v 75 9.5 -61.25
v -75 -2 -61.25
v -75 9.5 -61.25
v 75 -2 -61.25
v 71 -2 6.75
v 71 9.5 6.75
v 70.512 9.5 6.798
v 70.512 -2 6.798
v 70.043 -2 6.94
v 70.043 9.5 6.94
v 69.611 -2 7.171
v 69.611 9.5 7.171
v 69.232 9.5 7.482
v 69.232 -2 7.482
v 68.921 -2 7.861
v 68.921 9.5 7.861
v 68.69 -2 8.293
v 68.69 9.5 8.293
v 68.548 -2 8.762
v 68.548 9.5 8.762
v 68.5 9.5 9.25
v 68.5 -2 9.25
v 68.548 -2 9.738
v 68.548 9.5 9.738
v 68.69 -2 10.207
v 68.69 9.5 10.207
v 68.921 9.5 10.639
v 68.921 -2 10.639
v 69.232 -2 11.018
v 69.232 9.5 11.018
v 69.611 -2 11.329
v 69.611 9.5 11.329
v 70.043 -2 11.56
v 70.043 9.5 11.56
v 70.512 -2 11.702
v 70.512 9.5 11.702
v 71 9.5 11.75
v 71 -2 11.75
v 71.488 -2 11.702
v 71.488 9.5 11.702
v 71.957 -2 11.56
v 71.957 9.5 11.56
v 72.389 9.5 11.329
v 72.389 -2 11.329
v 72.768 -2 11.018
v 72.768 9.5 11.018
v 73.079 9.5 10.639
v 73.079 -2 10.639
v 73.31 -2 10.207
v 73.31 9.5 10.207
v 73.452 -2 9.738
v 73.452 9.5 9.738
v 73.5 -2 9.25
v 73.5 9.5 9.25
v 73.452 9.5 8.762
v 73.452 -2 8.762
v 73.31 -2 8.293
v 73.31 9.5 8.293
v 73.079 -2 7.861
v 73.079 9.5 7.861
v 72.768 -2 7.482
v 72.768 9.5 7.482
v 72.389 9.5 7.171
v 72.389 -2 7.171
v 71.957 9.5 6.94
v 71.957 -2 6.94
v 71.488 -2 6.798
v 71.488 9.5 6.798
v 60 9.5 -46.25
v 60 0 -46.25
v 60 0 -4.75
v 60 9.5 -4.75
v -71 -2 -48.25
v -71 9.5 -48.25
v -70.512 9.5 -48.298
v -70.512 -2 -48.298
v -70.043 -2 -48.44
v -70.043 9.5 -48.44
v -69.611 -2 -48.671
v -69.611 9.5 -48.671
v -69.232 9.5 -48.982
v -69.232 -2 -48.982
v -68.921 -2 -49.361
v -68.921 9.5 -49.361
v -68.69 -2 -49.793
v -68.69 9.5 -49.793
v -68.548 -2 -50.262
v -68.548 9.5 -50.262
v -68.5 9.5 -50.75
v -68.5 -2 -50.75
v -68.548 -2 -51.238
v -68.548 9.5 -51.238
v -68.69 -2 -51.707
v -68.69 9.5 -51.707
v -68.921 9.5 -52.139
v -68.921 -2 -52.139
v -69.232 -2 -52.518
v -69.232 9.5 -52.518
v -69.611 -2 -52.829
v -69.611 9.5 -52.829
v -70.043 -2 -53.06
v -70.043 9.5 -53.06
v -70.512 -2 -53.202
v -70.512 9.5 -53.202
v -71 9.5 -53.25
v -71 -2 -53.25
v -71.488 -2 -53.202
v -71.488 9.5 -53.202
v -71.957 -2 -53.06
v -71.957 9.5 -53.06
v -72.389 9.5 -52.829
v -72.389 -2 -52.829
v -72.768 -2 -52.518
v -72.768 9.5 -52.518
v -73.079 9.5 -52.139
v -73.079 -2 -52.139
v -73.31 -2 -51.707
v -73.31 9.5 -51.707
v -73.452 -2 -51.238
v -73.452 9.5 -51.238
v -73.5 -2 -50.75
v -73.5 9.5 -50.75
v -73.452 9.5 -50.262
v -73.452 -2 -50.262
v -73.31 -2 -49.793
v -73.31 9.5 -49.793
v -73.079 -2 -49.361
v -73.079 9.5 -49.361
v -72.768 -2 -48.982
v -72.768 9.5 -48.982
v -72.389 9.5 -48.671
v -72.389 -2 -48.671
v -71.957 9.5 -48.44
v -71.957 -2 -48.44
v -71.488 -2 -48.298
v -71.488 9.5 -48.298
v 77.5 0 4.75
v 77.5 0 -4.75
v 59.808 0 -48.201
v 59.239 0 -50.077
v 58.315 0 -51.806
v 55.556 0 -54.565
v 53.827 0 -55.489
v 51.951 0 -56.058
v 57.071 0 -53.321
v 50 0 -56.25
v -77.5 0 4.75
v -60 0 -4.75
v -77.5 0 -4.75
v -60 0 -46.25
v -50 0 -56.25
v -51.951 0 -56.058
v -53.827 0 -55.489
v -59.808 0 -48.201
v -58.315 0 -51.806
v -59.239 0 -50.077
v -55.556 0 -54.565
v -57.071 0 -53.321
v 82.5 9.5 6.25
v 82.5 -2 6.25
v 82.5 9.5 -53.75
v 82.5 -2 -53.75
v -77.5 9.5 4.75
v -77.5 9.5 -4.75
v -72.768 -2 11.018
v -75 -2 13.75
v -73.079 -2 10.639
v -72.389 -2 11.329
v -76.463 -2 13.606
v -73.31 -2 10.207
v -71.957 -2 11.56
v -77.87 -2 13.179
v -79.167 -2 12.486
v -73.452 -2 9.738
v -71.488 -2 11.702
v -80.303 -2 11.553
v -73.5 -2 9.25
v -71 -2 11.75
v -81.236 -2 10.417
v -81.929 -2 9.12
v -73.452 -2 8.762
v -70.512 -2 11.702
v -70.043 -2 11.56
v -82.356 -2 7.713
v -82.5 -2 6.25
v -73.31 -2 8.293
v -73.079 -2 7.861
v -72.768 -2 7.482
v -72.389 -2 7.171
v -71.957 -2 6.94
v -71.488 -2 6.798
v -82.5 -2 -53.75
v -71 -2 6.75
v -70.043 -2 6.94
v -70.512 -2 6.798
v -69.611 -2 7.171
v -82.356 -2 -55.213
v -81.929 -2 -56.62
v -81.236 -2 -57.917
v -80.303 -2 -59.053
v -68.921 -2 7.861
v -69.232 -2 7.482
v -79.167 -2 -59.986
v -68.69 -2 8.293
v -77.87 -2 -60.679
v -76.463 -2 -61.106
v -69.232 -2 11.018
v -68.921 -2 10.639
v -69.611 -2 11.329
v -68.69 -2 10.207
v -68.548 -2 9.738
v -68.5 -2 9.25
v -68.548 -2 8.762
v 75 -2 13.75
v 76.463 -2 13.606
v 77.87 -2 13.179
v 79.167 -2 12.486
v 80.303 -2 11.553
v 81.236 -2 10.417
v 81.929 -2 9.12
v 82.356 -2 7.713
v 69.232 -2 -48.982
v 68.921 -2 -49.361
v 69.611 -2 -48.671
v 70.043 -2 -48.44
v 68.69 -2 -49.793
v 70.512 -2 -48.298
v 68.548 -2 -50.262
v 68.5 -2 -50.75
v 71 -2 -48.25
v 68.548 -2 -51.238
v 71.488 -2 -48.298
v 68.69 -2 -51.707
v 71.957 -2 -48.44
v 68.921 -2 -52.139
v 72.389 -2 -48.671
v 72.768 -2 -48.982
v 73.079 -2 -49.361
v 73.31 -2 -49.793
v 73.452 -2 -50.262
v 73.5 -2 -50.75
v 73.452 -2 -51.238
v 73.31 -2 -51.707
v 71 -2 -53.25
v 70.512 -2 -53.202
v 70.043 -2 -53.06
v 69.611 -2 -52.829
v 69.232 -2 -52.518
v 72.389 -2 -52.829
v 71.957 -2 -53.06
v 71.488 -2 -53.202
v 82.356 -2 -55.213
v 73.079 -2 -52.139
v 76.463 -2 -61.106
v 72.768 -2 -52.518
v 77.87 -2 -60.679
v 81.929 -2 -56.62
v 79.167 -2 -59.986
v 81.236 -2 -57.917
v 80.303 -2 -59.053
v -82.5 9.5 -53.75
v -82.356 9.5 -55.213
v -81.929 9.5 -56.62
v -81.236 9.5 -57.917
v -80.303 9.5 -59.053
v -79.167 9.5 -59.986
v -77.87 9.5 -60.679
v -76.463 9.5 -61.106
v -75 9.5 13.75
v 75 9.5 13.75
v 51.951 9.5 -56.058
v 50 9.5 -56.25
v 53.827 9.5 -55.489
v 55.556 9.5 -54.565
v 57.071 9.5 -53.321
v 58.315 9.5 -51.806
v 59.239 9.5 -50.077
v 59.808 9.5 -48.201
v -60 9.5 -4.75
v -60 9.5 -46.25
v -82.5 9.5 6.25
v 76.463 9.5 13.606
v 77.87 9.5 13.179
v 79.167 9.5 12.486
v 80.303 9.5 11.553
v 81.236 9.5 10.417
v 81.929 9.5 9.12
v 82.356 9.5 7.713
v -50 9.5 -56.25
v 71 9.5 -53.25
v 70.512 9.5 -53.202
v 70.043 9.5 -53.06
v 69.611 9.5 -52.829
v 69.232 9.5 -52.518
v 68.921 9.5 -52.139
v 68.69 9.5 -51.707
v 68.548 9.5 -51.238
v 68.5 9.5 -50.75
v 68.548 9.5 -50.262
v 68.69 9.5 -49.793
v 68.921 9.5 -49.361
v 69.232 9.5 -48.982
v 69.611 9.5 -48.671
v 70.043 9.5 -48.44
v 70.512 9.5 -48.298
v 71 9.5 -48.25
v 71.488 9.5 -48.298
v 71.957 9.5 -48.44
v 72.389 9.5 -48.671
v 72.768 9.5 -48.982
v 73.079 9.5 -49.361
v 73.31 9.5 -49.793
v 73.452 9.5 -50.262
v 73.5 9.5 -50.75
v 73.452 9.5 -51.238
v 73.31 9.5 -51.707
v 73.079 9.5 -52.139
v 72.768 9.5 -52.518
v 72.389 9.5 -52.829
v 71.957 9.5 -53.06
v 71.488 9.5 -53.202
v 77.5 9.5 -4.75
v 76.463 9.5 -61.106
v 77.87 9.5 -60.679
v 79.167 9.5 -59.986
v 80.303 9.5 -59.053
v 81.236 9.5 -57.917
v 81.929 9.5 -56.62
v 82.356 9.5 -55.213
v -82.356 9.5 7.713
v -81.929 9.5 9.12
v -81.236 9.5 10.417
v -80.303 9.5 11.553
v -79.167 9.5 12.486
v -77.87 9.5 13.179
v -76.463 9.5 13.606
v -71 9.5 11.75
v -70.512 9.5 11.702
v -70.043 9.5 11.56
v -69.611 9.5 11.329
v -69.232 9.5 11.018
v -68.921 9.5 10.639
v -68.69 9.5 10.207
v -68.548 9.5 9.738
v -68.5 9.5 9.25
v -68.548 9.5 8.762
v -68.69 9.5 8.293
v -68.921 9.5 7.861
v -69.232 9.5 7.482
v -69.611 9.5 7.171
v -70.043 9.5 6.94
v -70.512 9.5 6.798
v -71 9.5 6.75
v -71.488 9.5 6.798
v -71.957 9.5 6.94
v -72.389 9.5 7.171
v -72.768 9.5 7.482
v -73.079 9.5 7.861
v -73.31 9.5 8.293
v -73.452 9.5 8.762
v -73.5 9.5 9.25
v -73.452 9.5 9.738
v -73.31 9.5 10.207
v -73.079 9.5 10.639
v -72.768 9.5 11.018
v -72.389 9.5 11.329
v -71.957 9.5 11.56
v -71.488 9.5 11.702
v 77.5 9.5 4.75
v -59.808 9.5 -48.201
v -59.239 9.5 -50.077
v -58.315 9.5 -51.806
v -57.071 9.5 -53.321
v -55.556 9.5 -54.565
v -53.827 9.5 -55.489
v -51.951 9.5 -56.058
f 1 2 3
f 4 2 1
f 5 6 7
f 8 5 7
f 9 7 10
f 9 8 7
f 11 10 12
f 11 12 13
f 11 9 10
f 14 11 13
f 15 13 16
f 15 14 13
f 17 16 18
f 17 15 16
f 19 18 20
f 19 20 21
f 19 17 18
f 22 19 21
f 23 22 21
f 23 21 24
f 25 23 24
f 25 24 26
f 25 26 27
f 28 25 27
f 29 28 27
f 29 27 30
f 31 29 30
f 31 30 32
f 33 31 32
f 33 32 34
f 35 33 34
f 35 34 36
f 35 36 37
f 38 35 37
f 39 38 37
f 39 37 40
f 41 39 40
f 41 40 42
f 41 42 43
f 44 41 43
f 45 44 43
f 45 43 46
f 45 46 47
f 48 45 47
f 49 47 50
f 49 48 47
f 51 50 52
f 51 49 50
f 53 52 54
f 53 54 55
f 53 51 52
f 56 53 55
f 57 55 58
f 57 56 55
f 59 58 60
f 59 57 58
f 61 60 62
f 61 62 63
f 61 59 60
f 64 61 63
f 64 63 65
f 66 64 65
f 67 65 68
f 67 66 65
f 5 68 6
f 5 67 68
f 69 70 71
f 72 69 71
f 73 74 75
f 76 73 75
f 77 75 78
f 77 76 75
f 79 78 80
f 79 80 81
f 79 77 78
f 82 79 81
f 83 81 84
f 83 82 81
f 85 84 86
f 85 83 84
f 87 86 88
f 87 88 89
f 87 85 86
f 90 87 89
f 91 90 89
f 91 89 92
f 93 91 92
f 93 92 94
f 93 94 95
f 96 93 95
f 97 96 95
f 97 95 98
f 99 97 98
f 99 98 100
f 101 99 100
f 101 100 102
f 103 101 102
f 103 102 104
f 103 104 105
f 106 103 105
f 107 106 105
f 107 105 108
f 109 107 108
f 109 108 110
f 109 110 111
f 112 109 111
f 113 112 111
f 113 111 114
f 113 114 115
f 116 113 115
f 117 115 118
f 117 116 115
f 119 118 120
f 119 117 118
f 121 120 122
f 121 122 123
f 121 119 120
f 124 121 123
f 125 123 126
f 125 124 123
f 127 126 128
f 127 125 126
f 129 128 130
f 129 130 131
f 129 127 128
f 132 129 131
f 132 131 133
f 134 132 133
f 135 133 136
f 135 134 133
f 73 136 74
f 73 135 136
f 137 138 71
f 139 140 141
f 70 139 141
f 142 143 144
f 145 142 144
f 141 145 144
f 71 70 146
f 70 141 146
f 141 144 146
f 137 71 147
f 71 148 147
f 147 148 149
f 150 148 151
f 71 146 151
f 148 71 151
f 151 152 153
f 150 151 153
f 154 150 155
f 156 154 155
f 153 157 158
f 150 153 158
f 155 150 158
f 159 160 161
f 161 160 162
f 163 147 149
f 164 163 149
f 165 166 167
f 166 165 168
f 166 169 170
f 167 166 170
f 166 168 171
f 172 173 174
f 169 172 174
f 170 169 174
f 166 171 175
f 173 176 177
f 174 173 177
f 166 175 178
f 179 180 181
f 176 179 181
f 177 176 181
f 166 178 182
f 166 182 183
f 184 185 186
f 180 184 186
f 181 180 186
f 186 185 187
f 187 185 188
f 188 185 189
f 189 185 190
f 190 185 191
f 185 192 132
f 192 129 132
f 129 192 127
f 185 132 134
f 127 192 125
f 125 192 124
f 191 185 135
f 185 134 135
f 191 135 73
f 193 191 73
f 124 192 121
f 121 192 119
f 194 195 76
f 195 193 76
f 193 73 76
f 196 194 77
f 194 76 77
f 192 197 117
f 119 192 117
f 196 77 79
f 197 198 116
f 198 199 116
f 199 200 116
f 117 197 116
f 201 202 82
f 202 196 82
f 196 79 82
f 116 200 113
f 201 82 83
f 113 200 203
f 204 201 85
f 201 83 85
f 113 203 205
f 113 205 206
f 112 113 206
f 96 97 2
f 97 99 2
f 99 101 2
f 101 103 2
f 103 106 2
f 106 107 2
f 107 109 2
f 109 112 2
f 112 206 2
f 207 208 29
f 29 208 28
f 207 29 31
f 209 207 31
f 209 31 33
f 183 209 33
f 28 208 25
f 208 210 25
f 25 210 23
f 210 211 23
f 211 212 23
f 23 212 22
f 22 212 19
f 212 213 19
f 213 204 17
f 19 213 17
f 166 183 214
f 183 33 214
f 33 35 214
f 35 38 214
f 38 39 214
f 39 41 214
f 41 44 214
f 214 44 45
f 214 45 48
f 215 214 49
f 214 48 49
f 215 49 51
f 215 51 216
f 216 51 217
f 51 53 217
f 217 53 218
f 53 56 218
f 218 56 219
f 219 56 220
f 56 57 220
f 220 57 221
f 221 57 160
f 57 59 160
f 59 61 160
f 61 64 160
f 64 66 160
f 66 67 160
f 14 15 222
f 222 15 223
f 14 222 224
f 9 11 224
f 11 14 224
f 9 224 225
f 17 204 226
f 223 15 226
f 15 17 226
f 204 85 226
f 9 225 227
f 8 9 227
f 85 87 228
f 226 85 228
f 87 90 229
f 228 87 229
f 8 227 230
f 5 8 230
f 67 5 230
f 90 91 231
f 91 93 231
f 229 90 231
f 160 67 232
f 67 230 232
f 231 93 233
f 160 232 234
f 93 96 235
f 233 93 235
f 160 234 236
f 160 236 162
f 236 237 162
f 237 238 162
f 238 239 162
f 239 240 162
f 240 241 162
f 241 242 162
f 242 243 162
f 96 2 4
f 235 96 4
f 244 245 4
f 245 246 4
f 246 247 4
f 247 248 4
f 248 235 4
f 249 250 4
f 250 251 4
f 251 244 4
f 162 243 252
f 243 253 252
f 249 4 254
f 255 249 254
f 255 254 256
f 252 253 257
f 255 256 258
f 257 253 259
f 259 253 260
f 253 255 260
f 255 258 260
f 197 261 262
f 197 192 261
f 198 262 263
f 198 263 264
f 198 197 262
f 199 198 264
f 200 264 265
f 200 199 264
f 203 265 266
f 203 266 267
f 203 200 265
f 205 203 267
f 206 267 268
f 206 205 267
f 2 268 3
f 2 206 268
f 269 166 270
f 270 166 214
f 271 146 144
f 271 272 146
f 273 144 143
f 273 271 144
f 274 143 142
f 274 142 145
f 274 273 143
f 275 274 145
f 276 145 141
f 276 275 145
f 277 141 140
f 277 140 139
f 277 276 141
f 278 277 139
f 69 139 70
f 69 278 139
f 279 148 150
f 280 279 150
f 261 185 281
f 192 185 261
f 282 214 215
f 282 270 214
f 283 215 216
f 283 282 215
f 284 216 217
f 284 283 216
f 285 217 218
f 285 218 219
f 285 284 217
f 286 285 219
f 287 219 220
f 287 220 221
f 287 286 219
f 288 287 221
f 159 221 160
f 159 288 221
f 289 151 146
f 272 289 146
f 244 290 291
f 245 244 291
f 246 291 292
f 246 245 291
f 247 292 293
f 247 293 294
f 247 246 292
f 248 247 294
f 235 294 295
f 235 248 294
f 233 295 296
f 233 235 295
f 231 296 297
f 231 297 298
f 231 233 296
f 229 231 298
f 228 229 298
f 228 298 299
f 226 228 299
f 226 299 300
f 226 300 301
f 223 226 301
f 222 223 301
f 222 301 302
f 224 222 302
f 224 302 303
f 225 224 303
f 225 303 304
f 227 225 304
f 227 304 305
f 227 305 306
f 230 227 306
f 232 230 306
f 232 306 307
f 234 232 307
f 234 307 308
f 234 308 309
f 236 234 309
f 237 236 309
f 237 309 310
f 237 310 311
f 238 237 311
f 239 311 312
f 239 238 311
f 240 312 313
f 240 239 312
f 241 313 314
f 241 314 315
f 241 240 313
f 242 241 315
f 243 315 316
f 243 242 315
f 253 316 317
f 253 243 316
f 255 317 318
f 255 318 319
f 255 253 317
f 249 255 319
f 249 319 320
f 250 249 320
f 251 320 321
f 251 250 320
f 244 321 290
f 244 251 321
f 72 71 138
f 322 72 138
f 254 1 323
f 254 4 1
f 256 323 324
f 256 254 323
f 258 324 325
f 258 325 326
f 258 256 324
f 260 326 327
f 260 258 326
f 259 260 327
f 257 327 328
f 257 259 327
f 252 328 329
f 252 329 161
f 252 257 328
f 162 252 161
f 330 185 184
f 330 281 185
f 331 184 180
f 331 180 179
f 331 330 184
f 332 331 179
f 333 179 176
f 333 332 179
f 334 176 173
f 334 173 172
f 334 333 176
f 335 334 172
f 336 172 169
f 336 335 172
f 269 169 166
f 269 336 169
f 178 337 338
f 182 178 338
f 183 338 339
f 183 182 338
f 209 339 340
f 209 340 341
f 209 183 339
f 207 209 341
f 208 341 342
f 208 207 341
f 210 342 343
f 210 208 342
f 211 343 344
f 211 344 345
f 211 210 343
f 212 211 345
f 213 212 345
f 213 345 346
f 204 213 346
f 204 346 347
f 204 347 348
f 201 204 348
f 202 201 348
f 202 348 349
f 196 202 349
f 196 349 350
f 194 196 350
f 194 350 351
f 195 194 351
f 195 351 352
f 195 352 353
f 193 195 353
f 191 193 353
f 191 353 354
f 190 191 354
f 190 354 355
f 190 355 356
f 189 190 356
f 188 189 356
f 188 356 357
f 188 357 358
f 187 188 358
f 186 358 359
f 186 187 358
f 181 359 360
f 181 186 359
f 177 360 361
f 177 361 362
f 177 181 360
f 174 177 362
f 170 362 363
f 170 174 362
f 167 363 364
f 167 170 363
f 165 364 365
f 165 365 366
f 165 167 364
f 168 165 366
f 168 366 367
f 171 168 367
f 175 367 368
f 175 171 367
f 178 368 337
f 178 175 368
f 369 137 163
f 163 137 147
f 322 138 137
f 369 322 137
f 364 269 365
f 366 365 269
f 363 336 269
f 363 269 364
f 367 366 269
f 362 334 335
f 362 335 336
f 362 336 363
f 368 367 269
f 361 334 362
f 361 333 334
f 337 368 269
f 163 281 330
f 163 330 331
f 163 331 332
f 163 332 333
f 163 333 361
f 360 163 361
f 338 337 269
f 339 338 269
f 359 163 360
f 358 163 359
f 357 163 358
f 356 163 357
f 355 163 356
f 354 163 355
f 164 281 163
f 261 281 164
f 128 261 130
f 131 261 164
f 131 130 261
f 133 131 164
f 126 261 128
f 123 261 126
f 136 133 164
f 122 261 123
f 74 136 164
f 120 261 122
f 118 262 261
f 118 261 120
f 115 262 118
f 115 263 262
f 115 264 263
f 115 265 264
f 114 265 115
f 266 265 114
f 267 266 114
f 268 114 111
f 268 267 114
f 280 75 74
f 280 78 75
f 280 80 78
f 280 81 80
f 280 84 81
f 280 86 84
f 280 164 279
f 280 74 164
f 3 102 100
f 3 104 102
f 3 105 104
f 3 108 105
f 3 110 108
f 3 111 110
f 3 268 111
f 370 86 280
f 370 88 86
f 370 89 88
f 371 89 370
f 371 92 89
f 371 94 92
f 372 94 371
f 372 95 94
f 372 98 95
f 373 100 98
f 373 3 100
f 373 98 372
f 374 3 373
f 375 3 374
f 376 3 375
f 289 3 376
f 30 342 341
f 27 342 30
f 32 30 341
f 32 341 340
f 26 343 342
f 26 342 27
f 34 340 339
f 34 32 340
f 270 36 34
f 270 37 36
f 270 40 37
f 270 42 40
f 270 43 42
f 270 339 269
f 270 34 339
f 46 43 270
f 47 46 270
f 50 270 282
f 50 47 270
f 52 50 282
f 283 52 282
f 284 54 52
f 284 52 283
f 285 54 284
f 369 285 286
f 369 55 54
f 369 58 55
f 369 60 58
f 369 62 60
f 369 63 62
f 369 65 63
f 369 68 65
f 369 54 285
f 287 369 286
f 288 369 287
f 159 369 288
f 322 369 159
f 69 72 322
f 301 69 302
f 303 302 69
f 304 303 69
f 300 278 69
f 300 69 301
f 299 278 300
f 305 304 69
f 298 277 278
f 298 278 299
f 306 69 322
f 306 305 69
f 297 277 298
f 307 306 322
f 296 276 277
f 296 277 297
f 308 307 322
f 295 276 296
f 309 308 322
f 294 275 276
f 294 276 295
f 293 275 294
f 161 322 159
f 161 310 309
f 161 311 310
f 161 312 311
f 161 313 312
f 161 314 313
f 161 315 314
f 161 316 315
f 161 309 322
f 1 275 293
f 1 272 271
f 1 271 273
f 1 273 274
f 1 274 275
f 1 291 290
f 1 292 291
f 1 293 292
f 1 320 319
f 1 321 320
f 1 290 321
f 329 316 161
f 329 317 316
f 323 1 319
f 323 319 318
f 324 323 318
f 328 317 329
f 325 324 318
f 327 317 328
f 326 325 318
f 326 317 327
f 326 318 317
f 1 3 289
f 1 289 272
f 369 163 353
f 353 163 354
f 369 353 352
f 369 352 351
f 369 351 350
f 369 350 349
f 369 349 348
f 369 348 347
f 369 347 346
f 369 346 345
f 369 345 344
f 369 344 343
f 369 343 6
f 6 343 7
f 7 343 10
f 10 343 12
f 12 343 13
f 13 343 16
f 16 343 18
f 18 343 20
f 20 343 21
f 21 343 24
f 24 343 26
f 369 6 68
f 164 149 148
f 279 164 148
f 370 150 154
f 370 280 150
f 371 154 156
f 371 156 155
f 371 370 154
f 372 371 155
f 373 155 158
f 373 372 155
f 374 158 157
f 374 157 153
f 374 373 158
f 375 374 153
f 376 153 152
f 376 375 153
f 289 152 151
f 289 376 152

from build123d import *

# Parameters (mm, degrees)
SKETCH_1_W      = 165
SKETCH_1_H      = 75
SKETCH_1_R      = 2.5
EXTRUDE_1_DEPTH = 9.5
EXTRUDE_START   = -2
SKETCH_1_2_W    = 165
SKETCH_1_2_H    = 75
SKETCH_1_2_R    = 2.5
EXTRUDE_2_DEPTH = 2
FILLET_1_R      = 10
FILLET_2_R      = 7.5


with BuildPart() as part:
    # Эскиз1 → Бобышка-Вытянуть1 (new body)
    with BuildSketch(Plane(origin=(0, 0, 0), x_dir=(1, 0, 0), z_dir=(0, 1, 0))):
        with Locations((0, 23.75)):
            Rectangle(SKETCH_1_W, SKETCH_1_H)
        with Locations((-71, -9.25)):
            Circle(SKETCH_1_R, mode=Mode.SUBTRACT)
        with Locations((-71, 50.75)):
            Circle(SKETCH_1_R, mode=Mode.SUBTRACT)
        with Locations((71, -9.25)):
            Circle(SKETCH_1_R, mode=Mode.SUBTRACT)
        with Locations((71, 50.75)):
            Circle(SKETCH_1_R, mode=Mode.SUBTRACT)
        Polygon((77.5, -4.75), (-77.5, -4.75), (-77.5, 4.75), (-60, 4.75), (-60, 56.25), (60, 56.25), (60, 4.75), (77.5, 4.75), align=None, mode=Mode.SUBTRACT)
    extrude(amount=EXTRUDE_1_DEPTH)

    # Эскиз1<2> → Бобышка-Вытянуть2 (add)
    with BuildSketch(Plane(origin=(0, 0, 0), x_dir=(1, 0, 0), z_dir=(0, 1, 0)).offset(EXTRUDE_START)):
        with Locations((0, 23.75)):
            Rectangle(SKETCH_1_2_W, SKETCH_1_2_H)
        with Locations((-71, -9.25)):
            Circle(SKETCH_1_2_R, mode=Mode.SUBTRACT)
        with Locations((71, -9.25)):
            Circle(SKETCH_1_2_R, mode=Mode.SUBTRACT)
        with Locations((-71, 50.75)):
            Circle(SKETCH_1_2_R, mode=Mode.SUBTRACT)
        with Locations((71, 50.75)):
            Circle(SKETCH_1_2_R, mode=Mode.SUBTRACT)
    extrude(amount=EXTRUDE_2_DEPTH)

    # Скругление1
    fillet_1_edges = [part.edges().sort_by_distance(p)[0] for p in [
        (60, 4.75, -56.25),
        (-60, 4.75, -56.25),
    ]]
    fillet(fillet_1_edges, radius=FILLET_1_R)

    # Скругление2
    fillet_2_edges = [part.edges().sort_by_distance(p)[0] for p in [
        (82.5, 3.75, 13.75),
        (82.5, 3.75, -61.25),
        (-82.5, 3.75, -61.25),
        (-82.5, 3.75, 13.75),
    ]]
    fillet(fillet_2_edges, radius=FILLET_2_R)


solid = part.part
